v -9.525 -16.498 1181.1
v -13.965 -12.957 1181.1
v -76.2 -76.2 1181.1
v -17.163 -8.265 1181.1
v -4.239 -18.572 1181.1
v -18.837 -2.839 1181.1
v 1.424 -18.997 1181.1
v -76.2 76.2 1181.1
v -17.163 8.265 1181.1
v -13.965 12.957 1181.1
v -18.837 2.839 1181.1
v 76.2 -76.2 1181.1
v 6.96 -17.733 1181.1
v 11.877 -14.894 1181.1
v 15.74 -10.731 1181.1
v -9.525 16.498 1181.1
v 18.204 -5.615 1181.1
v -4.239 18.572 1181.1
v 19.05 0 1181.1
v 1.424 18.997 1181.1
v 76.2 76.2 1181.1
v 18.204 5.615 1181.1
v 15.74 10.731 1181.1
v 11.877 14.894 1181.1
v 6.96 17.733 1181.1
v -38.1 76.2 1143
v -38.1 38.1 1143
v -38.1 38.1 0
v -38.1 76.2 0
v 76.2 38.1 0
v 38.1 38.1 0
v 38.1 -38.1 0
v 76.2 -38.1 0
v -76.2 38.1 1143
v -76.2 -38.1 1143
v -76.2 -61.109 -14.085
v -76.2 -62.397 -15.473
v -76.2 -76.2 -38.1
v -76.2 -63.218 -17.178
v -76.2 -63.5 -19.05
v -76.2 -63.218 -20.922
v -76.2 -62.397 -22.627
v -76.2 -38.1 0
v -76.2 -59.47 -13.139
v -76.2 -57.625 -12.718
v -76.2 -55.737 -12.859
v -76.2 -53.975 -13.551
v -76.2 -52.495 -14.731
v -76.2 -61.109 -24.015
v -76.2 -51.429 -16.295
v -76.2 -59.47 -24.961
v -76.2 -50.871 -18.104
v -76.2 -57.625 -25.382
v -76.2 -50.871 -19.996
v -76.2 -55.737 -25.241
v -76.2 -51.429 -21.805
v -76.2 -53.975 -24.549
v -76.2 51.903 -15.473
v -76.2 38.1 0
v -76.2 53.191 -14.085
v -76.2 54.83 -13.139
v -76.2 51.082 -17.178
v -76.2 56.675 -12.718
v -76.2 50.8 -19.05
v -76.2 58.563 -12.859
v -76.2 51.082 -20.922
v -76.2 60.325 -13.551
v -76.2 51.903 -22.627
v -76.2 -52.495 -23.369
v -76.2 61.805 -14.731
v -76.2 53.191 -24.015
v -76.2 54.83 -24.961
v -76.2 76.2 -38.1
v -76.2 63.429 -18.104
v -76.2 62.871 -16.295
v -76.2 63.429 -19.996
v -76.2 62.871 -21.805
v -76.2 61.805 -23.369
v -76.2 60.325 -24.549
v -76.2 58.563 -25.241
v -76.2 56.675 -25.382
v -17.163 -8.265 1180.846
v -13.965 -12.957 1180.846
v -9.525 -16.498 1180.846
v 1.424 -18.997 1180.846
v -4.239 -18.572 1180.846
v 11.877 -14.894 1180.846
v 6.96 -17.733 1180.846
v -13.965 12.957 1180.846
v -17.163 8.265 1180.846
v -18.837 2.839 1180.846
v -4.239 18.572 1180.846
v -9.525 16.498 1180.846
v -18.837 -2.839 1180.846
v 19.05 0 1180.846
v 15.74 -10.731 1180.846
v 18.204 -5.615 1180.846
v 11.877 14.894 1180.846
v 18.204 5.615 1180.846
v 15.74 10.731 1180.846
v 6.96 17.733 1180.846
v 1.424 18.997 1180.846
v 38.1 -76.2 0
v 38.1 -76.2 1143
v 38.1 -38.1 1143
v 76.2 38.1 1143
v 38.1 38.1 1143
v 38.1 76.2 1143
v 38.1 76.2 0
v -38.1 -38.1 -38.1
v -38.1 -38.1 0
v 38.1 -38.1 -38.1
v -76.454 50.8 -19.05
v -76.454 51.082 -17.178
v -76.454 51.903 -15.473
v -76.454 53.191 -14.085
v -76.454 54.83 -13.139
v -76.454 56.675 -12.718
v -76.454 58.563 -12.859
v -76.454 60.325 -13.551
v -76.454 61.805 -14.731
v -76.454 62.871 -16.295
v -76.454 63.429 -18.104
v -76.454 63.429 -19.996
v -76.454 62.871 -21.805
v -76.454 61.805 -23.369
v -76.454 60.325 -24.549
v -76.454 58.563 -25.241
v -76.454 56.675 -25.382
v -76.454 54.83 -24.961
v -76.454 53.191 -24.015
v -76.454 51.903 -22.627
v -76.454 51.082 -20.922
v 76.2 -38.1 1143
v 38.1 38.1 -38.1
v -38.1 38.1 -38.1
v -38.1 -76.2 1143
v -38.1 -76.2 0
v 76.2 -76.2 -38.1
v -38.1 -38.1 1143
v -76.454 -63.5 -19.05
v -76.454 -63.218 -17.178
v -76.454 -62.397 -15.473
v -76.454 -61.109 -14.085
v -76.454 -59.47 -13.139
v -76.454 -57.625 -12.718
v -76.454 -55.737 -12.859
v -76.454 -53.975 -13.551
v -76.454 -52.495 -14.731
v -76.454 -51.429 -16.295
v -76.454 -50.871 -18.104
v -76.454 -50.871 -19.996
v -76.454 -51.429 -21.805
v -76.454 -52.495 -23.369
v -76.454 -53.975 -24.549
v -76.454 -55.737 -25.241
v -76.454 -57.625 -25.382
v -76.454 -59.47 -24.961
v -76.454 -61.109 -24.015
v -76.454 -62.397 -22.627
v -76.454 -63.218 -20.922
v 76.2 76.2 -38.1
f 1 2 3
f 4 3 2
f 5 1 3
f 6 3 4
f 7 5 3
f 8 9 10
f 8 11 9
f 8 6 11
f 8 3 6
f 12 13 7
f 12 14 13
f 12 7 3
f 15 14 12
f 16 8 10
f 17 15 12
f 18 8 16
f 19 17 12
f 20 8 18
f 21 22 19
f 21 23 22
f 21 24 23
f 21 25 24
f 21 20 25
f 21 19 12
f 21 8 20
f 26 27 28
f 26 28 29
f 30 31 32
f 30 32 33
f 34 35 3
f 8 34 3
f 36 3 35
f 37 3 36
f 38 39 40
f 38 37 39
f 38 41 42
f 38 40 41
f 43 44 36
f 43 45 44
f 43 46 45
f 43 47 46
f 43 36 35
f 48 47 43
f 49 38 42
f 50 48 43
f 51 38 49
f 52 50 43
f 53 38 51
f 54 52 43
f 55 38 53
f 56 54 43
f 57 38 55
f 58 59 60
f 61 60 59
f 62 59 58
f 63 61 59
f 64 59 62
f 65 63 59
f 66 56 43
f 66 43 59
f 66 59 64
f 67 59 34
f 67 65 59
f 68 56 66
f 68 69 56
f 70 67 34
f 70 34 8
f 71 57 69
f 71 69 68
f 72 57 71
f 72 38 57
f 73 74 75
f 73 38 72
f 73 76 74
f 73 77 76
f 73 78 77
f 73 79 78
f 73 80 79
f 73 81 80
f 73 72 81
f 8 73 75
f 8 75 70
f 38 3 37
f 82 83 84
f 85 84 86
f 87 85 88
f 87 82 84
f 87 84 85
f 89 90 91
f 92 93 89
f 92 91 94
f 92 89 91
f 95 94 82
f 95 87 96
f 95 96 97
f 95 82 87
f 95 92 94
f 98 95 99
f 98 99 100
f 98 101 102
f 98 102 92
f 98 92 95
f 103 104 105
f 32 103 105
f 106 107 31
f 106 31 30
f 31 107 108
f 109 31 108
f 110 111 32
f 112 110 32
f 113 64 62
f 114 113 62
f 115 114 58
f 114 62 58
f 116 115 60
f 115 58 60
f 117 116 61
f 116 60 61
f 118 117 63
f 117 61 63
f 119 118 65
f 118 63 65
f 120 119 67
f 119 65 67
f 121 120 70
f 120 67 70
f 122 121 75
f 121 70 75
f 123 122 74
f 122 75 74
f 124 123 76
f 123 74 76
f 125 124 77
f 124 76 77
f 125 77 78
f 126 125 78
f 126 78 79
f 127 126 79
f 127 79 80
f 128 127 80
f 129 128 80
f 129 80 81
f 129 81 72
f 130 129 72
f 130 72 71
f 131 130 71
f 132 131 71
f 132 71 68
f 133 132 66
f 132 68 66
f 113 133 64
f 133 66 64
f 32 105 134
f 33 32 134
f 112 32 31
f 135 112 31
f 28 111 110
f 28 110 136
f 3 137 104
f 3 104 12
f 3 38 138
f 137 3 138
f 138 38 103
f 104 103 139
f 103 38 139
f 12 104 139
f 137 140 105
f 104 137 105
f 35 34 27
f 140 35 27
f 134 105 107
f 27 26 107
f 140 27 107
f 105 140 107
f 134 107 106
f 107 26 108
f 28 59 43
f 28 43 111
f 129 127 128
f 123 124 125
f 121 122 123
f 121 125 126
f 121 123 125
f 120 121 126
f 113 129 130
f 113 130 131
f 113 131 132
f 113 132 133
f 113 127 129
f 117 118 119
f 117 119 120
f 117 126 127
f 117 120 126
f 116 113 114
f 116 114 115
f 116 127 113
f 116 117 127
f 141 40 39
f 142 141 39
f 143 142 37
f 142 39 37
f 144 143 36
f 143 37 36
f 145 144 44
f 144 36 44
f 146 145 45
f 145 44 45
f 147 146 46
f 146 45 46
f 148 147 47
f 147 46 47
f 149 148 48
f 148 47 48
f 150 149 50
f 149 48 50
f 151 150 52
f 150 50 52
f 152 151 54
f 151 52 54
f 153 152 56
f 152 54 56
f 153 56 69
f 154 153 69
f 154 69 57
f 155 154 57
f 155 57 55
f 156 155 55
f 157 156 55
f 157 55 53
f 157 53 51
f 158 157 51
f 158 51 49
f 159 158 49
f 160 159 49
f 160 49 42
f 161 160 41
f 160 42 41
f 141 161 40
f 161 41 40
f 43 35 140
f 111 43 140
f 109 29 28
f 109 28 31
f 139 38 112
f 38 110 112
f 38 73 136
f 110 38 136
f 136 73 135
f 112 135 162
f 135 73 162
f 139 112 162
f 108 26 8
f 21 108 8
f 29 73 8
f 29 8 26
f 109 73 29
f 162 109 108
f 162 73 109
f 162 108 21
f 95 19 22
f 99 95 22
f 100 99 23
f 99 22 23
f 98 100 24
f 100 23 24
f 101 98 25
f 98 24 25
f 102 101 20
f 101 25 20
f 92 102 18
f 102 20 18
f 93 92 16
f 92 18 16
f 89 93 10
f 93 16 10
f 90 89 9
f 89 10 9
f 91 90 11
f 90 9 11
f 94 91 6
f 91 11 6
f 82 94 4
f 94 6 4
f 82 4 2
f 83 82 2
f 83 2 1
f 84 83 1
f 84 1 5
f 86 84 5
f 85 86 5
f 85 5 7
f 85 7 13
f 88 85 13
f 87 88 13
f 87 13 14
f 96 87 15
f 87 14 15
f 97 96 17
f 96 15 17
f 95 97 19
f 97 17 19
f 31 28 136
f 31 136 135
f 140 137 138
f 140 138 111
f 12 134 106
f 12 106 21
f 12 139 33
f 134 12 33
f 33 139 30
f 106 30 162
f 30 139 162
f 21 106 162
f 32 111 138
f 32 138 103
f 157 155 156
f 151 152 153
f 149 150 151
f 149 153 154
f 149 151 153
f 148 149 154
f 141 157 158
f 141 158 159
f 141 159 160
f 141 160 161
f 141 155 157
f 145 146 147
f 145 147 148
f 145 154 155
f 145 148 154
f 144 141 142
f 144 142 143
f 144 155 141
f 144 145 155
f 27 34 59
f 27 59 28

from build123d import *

# Parameters (mm, degrees)
F0_W      = 152.4
F0_H      = 152.4
F1_DEPTH  = 38.1
F2_W      = 76.2
F2_H      = 76.2
F3_DEPTH  = 38.1
F4_W      = 38.1
F4_H      = 38.1
F5_DEPTH  = 1143
F6_W      = 152.4
F6_H      = 152.4
F7_DEPTH  = 38.1
F8_R      = 6.35
F9_DEPTH  = 0.254
F10_R     = 19.05
F11_DEPTH = 0.254


with BuildPart() as f1:
    # F0 (on Top) → F1 (new body)
    with BuildSketch(Plane.XY):
        Rectangle(F0_W, F0_H)
    extrude(amount=-F1_DEPTH)

    # F2 (on face) → F3 (cut)
    with BuildSketch(Plane.XY):
        Rectangle(F2_W, F2_H)
    extrude(amount=-F3_DEPTH, mode=Mode.SUBTRACT)

    # F4 (on face) → F5 (join)
    with BuildSketch(Plane.XY):
        with Locations((-57.15, -57.15)):
            Rectangle(F4_W, F4_H)
        with Locations((-57.15, 57.15)):
            Rectangle(F4_W, F4_H)
        with Locations((57.15, 57.15)):
            Rectangle(F4_W, F4_H)
        with Locations((57.15, -57.15)):
            Rectangle(F4_W, F4_H)
    extrude(amount=F5_DEPTH)

    # F6 (on face) → F7 (join)
    with BuildSketch(Plane.XY.offset(1143)):
        Rectangle(F6_W, F6_H)
    extrude(amount=F7_DEPTH)

    # F8 (on face) → F9 (join)
    with BuildSketch(Plane(origin=(-76.2, 0, 0), x_dir=(0, -1, 0), z_dir=(-1, 0, 0))):
        with Locations((-57.15, -19.05)):
            Circle(F8_R)
        with Locations((57.15, -19.05)):
            Circle(F8_R)
    extrude(amount=F9_DEPTH)

    # F10 (on face) → F11 (cut)
    with BuildSketch(Plane.XY.offset(1181.1)):
        Circle(F10_R)
    extrude(amount=-F11_DEPTH, mode=Mode.SUBTRACT)


solid = f1.part
